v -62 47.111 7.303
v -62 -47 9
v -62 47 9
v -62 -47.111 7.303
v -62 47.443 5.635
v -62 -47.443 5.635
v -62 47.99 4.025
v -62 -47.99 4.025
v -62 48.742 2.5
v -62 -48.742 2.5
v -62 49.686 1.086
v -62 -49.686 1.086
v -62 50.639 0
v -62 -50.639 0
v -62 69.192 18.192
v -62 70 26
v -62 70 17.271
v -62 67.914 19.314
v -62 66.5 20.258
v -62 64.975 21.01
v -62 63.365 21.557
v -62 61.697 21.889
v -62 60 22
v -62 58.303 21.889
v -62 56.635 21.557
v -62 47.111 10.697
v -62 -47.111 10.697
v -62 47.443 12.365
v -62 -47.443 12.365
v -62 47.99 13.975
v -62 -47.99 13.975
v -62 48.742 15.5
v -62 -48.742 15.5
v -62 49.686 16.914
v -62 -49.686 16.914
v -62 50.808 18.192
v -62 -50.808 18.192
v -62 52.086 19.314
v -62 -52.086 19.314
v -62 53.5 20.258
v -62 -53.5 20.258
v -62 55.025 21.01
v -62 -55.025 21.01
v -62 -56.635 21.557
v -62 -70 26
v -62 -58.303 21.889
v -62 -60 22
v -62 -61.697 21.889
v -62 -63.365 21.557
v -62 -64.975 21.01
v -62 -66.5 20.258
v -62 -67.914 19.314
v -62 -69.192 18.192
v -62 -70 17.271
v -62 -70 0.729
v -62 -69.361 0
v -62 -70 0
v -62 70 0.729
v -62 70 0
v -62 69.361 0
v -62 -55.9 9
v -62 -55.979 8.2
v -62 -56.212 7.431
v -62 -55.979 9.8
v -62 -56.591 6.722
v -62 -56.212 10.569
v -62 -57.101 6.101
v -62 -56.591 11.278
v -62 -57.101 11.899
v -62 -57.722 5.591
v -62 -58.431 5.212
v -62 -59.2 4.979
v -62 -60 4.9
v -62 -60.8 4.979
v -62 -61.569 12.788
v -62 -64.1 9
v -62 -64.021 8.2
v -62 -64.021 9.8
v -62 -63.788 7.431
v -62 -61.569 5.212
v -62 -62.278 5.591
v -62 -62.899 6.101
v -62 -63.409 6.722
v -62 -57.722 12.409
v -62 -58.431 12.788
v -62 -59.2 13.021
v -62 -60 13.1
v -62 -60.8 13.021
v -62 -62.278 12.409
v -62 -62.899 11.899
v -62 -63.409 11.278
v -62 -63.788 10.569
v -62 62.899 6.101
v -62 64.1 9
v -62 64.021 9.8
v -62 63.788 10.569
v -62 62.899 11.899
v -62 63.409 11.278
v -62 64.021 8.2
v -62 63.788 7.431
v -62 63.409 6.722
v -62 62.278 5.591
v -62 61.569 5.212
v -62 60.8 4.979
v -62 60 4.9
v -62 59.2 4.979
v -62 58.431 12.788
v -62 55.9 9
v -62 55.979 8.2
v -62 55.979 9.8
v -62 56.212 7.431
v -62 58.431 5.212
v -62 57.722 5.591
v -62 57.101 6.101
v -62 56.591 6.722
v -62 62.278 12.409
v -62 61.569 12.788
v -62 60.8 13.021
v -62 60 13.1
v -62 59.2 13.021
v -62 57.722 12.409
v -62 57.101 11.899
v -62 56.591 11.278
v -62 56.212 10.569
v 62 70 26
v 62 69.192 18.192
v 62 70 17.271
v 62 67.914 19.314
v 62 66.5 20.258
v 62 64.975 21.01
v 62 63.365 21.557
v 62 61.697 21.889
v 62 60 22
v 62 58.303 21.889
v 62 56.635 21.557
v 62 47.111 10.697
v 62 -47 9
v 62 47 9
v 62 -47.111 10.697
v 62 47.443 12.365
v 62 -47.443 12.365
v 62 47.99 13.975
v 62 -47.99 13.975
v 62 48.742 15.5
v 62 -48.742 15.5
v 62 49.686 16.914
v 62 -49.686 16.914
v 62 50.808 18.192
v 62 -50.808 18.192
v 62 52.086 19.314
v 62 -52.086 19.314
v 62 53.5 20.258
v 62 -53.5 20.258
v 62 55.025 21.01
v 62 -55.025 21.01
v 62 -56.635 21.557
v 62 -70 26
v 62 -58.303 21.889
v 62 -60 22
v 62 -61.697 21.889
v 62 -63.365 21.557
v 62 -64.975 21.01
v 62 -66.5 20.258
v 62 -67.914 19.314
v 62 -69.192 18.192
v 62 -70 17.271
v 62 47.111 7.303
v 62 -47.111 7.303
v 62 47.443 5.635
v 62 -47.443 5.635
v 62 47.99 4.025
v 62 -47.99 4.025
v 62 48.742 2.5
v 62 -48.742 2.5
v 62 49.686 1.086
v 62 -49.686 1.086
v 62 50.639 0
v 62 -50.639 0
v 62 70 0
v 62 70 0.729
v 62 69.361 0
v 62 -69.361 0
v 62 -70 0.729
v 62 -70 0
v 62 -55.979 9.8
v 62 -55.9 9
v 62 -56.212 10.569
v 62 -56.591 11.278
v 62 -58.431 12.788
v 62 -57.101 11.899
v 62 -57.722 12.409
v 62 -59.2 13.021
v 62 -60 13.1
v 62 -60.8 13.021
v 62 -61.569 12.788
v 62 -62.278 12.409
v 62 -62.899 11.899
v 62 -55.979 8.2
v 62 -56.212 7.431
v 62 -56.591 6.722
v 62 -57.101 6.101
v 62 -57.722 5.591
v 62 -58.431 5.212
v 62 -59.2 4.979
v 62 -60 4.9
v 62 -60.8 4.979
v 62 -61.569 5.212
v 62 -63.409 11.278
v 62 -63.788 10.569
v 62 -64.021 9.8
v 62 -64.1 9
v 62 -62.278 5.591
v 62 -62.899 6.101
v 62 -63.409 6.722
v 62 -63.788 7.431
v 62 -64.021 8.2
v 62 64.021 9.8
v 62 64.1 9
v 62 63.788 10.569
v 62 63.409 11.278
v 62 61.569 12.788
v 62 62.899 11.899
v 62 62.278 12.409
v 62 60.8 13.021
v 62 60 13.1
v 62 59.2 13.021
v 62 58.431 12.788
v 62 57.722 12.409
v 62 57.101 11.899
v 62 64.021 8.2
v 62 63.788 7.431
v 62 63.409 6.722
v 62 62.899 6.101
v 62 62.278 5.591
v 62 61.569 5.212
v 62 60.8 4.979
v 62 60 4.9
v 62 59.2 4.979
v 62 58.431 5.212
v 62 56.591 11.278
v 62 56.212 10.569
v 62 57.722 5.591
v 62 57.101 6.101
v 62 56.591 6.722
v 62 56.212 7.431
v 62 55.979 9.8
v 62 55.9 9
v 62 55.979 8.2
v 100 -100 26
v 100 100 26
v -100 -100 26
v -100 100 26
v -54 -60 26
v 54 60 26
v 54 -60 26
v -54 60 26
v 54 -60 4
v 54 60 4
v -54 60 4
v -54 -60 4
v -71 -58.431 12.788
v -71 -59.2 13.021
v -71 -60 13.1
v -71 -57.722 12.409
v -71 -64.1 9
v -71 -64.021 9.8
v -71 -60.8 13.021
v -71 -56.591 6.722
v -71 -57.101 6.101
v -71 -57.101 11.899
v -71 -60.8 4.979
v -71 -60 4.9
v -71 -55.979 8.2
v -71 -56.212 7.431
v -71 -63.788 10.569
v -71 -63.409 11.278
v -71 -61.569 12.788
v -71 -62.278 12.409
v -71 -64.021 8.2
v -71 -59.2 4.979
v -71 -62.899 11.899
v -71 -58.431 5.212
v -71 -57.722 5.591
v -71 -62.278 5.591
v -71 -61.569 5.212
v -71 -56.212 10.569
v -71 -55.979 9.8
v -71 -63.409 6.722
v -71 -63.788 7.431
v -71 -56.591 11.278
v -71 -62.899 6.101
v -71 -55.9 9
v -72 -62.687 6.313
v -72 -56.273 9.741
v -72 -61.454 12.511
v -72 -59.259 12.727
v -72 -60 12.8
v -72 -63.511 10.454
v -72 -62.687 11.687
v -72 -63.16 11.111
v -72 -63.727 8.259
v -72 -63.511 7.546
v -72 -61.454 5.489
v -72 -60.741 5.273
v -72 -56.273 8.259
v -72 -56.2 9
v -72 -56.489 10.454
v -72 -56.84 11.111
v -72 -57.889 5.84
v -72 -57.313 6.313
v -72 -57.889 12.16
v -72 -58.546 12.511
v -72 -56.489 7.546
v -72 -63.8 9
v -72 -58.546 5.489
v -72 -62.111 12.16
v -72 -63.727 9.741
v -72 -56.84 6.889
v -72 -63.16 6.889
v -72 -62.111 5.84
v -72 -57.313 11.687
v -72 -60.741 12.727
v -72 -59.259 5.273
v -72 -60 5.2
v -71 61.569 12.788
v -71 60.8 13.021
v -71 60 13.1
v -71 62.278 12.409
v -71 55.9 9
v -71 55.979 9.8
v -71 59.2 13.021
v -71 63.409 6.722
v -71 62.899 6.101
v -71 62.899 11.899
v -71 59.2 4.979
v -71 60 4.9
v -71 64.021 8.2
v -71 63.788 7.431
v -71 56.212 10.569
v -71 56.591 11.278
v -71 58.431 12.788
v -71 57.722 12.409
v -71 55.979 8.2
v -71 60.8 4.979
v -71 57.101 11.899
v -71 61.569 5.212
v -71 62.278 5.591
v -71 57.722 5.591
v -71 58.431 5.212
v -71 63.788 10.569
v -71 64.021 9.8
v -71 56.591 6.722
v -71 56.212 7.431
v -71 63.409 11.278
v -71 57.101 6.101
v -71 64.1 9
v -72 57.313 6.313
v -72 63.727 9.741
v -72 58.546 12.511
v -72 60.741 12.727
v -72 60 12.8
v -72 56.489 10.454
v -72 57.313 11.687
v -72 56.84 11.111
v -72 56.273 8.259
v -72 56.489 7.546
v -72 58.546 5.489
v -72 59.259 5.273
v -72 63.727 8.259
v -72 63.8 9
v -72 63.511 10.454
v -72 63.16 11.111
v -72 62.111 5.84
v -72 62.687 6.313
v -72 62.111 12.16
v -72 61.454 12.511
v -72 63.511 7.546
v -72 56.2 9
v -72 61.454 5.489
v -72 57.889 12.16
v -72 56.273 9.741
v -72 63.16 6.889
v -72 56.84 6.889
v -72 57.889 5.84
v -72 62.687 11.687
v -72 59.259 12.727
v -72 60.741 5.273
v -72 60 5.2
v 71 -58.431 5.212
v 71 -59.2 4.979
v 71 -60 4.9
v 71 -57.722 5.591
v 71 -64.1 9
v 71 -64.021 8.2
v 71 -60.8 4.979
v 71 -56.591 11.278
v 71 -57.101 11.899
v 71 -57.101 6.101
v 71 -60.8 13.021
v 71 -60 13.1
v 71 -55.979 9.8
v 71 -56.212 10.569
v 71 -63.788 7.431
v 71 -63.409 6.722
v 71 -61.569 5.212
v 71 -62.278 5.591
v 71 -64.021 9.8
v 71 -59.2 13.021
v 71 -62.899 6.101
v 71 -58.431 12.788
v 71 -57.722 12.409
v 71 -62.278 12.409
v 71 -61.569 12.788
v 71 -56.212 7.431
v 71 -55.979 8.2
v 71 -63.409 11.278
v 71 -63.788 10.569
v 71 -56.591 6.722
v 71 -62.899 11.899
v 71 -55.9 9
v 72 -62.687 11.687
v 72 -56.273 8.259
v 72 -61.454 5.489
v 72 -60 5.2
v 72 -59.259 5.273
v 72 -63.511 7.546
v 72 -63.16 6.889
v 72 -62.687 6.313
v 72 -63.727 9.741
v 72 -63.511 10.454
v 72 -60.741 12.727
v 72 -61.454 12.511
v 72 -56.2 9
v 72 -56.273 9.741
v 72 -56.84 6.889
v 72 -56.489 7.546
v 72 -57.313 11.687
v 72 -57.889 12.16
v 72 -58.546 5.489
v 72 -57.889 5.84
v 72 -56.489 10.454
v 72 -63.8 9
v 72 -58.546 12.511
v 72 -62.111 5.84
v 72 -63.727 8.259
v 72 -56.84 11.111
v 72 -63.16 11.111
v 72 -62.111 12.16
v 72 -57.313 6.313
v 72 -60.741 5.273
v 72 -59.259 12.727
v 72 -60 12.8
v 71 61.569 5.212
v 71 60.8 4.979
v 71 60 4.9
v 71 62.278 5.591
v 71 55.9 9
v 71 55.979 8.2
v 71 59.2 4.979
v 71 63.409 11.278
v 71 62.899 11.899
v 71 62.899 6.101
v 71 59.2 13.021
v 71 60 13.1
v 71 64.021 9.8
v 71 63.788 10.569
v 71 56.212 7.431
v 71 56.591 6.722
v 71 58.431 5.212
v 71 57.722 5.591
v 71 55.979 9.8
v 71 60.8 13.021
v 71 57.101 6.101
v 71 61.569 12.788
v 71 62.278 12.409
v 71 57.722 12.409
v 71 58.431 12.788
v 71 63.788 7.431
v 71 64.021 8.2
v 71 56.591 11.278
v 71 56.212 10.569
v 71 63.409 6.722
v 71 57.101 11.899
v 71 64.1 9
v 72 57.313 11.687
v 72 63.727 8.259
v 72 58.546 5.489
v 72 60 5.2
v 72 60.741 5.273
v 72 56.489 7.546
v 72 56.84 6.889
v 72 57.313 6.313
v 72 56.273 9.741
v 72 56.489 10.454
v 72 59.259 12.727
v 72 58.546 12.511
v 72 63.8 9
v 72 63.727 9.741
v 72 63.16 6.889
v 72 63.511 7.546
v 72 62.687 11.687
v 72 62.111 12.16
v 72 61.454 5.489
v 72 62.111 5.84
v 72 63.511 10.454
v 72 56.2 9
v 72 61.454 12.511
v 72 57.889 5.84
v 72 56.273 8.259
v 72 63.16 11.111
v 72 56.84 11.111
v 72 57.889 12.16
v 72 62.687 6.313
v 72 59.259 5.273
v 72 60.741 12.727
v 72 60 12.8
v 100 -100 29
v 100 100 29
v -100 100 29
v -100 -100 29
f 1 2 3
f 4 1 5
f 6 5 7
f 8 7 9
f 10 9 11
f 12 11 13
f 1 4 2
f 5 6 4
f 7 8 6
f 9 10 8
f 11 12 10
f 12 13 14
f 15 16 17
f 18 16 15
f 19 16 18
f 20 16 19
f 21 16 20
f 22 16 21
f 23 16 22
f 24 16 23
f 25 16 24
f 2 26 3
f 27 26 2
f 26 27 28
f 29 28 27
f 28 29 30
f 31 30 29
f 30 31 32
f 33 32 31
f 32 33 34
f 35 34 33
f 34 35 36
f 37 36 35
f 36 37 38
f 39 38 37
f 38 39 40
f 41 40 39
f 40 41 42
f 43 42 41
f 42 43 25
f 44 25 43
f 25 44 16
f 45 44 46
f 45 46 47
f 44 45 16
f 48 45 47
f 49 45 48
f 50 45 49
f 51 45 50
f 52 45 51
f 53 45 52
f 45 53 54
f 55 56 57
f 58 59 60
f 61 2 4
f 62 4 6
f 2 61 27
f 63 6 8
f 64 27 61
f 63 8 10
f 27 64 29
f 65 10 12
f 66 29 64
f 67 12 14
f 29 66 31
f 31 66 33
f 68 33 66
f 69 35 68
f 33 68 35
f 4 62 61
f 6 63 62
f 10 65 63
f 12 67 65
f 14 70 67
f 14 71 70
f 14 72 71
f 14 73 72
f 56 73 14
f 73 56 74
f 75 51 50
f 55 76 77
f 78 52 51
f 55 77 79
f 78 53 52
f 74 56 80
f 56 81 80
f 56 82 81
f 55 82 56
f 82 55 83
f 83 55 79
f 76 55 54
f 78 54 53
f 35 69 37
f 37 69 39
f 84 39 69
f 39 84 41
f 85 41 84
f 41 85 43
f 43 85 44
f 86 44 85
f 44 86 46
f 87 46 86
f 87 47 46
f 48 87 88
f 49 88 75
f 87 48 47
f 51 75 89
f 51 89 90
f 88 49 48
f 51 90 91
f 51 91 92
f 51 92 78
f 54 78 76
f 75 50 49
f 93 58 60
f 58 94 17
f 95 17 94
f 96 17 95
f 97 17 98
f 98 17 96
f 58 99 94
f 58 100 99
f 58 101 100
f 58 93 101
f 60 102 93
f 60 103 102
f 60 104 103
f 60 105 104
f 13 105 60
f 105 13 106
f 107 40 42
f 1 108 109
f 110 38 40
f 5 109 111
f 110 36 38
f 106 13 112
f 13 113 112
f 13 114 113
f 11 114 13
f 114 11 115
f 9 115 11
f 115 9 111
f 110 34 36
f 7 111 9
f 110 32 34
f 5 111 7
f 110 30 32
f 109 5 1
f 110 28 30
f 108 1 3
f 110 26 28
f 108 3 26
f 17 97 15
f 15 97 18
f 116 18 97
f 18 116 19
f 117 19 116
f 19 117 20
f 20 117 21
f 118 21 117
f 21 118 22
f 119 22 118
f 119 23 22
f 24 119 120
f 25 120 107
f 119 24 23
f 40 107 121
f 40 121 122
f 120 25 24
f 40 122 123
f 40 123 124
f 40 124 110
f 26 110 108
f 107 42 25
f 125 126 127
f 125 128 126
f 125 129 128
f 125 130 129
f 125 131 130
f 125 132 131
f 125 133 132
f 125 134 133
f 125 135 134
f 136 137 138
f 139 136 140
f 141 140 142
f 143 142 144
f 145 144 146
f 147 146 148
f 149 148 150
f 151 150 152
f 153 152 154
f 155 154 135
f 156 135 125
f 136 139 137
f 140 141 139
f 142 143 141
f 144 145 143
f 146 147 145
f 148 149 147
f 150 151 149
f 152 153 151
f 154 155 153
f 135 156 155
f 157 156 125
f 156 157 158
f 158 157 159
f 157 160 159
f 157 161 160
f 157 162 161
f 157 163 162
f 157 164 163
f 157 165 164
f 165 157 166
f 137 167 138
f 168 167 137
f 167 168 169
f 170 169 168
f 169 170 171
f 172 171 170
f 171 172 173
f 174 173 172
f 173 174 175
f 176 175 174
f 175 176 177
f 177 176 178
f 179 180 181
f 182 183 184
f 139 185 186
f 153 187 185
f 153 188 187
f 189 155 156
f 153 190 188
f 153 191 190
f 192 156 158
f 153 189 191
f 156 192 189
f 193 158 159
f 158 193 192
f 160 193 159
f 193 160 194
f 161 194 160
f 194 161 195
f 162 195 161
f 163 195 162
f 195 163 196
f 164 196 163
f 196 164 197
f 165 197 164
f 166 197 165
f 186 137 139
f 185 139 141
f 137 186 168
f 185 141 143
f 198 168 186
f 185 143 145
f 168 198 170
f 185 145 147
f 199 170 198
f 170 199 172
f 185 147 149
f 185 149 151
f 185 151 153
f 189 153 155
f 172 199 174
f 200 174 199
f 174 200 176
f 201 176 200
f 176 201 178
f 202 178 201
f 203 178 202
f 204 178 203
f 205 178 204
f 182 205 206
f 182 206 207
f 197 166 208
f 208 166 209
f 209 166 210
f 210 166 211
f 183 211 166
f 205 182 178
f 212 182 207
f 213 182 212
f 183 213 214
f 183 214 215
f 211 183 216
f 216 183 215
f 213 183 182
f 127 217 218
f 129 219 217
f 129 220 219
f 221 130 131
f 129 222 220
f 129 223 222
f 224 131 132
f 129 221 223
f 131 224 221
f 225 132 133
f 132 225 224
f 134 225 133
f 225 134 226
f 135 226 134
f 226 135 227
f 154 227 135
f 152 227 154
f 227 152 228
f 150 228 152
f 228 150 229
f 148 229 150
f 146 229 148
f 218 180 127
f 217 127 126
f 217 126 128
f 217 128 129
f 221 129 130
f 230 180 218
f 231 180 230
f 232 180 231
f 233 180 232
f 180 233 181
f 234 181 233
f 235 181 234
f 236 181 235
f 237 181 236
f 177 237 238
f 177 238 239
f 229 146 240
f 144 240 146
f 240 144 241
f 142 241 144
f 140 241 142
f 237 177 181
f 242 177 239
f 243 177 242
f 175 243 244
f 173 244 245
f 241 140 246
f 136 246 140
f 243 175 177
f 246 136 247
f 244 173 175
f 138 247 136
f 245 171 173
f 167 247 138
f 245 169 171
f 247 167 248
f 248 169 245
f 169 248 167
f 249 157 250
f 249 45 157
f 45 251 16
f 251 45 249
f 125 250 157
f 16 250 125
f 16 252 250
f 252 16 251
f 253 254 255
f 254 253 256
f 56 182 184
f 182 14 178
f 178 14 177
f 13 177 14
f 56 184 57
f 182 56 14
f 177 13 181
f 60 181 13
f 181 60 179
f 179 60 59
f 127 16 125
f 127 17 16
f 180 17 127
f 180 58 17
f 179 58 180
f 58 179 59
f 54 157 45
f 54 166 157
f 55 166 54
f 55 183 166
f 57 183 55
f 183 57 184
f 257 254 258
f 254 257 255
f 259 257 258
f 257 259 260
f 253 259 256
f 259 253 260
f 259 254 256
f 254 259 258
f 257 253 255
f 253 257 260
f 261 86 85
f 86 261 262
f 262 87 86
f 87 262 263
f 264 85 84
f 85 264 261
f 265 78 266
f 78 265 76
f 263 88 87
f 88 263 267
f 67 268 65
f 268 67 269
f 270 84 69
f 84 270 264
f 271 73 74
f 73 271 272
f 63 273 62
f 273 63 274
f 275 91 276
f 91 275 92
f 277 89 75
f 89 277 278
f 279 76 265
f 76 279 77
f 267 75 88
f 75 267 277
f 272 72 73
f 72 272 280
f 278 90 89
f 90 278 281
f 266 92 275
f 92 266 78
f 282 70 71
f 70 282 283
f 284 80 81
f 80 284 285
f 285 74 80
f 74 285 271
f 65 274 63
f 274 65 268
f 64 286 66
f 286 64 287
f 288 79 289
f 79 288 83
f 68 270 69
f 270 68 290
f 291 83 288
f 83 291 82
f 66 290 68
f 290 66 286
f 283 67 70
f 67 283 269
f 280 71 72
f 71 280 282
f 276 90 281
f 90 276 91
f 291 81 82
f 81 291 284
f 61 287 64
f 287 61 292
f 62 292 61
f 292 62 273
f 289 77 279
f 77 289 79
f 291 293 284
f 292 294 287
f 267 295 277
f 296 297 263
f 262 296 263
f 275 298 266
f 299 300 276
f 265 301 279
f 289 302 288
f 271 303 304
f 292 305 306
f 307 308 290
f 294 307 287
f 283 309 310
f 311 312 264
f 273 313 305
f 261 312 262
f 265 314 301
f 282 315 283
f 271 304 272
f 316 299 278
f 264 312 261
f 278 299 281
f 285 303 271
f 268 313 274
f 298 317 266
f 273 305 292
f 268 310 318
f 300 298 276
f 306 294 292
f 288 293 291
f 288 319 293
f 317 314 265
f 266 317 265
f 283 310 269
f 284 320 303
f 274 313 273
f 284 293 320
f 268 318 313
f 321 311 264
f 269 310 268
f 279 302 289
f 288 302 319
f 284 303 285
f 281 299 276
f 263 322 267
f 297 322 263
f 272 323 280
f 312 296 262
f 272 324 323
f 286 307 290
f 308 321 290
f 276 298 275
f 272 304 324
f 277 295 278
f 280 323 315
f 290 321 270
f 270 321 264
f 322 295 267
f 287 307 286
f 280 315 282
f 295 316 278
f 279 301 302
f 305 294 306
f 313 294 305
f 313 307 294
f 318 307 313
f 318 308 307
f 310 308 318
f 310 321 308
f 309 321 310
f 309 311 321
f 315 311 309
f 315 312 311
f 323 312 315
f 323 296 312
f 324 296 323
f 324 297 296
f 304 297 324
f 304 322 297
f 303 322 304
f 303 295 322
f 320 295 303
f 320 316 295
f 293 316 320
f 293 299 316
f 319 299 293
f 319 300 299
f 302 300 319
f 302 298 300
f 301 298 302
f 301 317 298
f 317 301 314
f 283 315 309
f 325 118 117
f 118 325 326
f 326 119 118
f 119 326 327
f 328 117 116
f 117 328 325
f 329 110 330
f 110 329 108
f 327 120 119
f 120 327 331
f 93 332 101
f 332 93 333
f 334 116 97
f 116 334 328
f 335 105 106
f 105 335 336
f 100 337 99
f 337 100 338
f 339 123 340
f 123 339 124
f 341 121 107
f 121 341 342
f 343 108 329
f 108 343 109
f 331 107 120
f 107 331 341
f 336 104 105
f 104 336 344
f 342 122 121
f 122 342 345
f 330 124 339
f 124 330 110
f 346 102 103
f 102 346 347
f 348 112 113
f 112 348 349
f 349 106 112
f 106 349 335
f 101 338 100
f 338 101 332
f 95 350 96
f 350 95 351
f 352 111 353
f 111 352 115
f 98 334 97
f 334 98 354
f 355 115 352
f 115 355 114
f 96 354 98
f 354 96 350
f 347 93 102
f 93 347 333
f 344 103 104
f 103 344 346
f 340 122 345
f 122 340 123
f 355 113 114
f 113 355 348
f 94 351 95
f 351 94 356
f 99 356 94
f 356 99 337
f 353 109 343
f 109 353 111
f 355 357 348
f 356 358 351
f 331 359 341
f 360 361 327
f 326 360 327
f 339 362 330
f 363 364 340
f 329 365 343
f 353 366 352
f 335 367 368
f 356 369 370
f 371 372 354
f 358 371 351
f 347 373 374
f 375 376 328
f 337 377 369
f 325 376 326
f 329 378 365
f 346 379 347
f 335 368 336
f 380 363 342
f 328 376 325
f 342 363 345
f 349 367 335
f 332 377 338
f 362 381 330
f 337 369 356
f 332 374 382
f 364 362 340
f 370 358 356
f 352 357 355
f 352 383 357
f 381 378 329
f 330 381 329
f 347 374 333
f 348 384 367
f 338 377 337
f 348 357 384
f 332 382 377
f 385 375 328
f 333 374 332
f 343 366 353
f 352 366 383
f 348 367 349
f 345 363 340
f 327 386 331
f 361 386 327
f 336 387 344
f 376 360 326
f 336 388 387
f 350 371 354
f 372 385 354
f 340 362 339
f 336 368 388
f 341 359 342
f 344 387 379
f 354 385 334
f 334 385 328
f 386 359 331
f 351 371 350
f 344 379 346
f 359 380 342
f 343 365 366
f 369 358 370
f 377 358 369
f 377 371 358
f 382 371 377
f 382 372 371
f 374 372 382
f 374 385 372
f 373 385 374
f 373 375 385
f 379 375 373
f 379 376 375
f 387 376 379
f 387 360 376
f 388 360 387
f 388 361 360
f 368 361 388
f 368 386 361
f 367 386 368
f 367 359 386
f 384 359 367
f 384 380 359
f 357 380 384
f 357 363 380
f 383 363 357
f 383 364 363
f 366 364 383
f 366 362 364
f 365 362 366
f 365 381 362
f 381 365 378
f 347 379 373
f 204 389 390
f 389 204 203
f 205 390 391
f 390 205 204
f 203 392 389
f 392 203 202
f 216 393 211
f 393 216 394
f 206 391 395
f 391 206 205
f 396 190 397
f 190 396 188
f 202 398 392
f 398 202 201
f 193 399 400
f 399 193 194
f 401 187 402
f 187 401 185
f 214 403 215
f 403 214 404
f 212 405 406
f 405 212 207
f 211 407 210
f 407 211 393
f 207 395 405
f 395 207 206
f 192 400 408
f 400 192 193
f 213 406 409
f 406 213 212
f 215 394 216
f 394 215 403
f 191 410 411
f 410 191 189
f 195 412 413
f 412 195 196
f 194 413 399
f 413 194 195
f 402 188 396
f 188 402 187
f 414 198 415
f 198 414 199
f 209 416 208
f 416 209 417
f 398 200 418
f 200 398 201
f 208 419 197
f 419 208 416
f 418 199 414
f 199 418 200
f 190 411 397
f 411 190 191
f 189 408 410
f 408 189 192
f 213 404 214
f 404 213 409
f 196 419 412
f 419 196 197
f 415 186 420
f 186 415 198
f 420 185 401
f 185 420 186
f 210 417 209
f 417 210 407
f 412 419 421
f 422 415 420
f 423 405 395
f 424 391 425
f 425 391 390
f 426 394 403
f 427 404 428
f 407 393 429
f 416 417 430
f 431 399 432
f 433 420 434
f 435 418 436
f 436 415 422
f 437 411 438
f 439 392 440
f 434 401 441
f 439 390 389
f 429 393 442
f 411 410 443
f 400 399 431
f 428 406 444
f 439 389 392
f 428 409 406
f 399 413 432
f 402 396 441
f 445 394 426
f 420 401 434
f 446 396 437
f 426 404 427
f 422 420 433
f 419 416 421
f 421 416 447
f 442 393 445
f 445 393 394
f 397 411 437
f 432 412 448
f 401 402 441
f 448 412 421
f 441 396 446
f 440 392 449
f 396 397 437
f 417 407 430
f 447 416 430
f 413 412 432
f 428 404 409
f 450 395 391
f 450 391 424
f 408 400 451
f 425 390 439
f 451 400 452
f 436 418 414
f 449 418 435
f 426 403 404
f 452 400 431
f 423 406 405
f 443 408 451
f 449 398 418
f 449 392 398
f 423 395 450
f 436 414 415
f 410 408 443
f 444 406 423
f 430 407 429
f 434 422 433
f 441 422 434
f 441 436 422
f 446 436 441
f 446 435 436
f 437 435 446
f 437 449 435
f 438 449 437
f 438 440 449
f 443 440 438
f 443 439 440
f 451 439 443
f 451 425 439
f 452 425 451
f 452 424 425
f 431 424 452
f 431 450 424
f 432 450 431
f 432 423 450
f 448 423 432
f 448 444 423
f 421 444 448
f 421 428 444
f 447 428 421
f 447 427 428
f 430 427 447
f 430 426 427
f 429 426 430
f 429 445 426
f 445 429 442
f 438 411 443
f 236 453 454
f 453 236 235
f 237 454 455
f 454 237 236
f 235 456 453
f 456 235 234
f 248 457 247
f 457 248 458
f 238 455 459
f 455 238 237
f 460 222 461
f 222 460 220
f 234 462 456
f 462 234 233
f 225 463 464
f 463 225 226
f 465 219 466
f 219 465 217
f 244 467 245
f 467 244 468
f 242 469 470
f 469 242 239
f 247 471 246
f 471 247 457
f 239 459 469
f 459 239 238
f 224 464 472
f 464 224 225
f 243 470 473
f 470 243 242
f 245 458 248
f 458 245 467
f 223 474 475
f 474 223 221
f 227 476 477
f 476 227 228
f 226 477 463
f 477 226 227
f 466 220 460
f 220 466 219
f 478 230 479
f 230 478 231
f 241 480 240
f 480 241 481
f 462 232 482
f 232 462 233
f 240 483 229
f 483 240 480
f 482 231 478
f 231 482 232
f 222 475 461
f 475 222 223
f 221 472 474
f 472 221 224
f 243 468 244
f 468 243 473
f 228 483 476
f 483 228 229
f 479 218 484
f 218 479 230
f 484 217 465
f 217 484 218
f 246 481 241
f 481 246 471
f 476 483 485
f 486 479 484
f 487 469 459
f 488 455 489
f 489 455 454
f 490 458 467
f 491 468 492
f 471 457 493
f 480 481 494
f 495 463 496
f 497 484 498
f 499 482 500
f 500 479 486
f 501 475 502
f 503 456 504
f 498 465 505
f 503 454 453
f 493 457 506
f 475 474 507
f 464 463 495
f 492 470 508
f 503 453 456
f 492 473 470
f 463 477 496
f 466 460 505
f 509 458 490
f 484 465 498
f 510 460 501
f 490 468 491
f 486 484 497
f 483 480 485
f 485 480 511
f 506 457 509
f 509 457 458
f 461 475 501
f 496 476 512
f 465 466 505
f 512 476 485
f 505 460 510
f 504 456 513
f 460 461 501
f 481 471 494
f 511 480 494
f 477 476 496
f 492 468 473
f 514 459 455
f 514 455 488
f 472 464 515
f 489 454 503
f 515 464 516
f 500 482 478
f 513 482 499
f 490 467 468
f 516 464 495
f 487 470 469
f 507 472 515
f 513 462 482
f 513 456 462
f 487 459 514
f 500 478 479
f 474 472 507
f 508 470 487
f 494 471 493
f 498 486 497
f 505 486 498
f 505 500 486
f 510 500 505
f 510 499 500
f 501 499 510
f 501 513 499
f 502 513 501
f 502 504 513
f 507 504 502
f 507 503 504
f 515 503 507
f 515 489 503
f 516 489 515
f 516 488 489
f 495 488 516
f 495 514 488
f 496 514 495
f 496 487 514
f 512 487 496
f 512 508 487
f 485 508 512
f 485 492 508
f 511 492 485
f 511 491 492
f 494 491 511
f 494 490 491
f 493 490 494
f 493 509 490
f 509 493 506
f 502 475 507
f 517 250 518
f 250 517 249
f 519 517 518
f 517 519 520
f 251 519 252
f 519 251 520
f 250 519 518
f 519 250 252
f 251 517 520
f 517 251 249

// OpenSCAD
// file: params.scad
// ── Shared parameters for card track system ──────────────────────────────────

// 608ZZ skateboard bearing
bearing_od = 22;
bearing_id = 8;
bearing_w  = 7;

// Track channel (straight and corner sections share this profile)
track_inner_w   = 150;   // inner width of U-channel
track_wall_h    = 32;    // wall height above floor
track_wall_t    = 5;     // wall thickness
track_floor_t   = 4;     // floor thickness
track_sec_len   = 200;   // length of one straight section

// Alignment peg (male/female) at section ends
peg_d = 5;
peg_h = 4;

// Cart
cart_plate   = 200;    // 200 × 200 mm top plate
plate_t      = 3;      // plate thickness
// body is 124 mm wide; posts (10 mm each side) bring total to 144 mm → 3 mm clearance each side in 150 mm channel
cart_body_w  = 124;
cart_body_h  = 26;     // height of cart body (must be ≤ track_wall_h)
wheelbase    = 120;    // front-to-rear axle spacing

// Stub-axle posts (bearing friction-fit over post)
post_d       = 8.2;   // 0.2 mm press-fit onto 608ZZ bore (8 mm)
// post breakdown: 1.5 mm shoulder gap + 7 mm bearing + 1.5 mm retention nose = 10 mm
post_len     = 10;
// post centre sits 9 mm above cart body bottom face:
//   bearing centre = 11 mm above track floor  (= bearing_od/2)
//   cart body bottom clears floor by 2 mm      (= 11 - 9)
post_z       = 9;

// Circular relief cut into the body side face at each post base.
// Prevents the bearing outer race from rubbing against the body during spin.
// Diameter = bearing OD + 4 mm (2 mm radial clearance all around)
bearing_relief_d = bearing_od + 4;   // 26 mm
bearing_relief_depth = 1.5;          // axial depth of relief pocket

// Corner
corner_inner_r = 100;  // inner radius of corner track centre-line
// main file
include <params.scad>

// ── Cart ─────────────────────────────────────────────────────────────────────
// 4 horizontal stub-axle posts; 608ZZ bearings friction-fit (press) onto posts.
// Bearing outer race (22 mm OD) rolls on the track floor.
//
// Print orientation: lay on one long side face (posts pointing up/down on bed).
// No support needed — posts are horizontal and short.
//
// Assembly:
//   1. Press each bearing onto its post from the outside.  The 0.2 mm
//      interference keeps it seated; the 1.5 mm retention nose prevents it
//      sliding off during use.
//   2. Lower the cart into the track channel.  The 200 mm plate overhangs
//      both track walls.

cart_body_len = wheelbase + 20;   // 140 mm front-to-rear

// ── Stub axle post ────────────────────────────────────────────────────────────
// Origin at the post base (flush with cart body side face), pointing in +X.
// Bearing slides on from the +X end.
module stub_axle() {
    // Shoulder gap first (1.5 mm) — bearing face never contacts body side
    // (the post is solid all the way; the gap is created by the relief recess
    //  in the body — see cart_body() below)

    // Main shaft — bearing bore press-fits here
    cylinder(d = post_d, h = post_len - 1, $fn = 32);

    // Retention nose: tapered last 1 mm keeps bearing from walking off
    translate([0, 0, post_len - 1])
        cylinder(d1 = post_d, d2 = post_d - 0.6, h = 1, $fn = 32);
}

// ── Cart body ─────────────────────────────────────────────────────────────────
// Centred in XY.  Bottom face at Z = 0.
module cart_body() {
    difference() {
        // Main block
        cube([cart_body_w, cart_body_len, cart_body_h], center = true);

        // Lightening pocket — open at the top (toward the plate)
        translate([0, 0, 4])
            cube([cart_body_w - 16, cart_body_len - 20, cart_body_h],
                 center = true);

        // Bearing clearance relief — one pocket per post, cut into the
        // body side face.  Diameter = bearing OD + 4 mm so the outer
        // race spins without touching the body.
        for (sx = [-1, 1], sy = [-1, 1]) {
            translate([
                sx * cart_body_w / 2,           // flush with body side face
                sy * wheelbase / 2,              // front / rear axle position
                -cart_body_h / 2 + post_z       // post-centre height
            ])
            rotate([0, sx * 90, 0])             // face outward
                cylinder(
                    d = bearing_relief_d,
                    h = bearing_relief_depth,
                    center = false,
                    $fn = 48
                );
        }
    }
}

// ── Top plate ─────────────────────────────────────────────────────────────────
module top_plate() {
    cube([cart_plate, cart_plate, plate_t], center = true);
}

// ── Assembly — origin at cart body bottom face ────────────────────────────────
// In the assembled track:
//   Z = 0  → track floor
//   Z = 2  → cart body bottom  (2 mm clearance from floor)
//   Z = 11 → post / bearing centre  (= bearing_od/2, so bearing just touches floor)
//   Z = 28 → cart body top
//   Z = 31 → top of plate

// Cart body — bottom at Z = 0 in this local frame
translate([0, 0, cart_body_h / 2])
    cart_body();

// Top plate
translate([0, 0, cart_body_h + plate_t / 2])
    top_plate();

// 4 stub axles — two per side (±X), front and rear (±Y)
for (sx = [-1, 1], sy = [-1, 1]) {
    translate([
        sx * cart_body_w / 2,    // start at body side face
        sy * wheelbase / 2,      // front / rear
        post_z                   // post-centre height above body bottom
    ])
    rotate([0, sx * 90, 0])      // point outward in ±X
        stub_axle();
}
